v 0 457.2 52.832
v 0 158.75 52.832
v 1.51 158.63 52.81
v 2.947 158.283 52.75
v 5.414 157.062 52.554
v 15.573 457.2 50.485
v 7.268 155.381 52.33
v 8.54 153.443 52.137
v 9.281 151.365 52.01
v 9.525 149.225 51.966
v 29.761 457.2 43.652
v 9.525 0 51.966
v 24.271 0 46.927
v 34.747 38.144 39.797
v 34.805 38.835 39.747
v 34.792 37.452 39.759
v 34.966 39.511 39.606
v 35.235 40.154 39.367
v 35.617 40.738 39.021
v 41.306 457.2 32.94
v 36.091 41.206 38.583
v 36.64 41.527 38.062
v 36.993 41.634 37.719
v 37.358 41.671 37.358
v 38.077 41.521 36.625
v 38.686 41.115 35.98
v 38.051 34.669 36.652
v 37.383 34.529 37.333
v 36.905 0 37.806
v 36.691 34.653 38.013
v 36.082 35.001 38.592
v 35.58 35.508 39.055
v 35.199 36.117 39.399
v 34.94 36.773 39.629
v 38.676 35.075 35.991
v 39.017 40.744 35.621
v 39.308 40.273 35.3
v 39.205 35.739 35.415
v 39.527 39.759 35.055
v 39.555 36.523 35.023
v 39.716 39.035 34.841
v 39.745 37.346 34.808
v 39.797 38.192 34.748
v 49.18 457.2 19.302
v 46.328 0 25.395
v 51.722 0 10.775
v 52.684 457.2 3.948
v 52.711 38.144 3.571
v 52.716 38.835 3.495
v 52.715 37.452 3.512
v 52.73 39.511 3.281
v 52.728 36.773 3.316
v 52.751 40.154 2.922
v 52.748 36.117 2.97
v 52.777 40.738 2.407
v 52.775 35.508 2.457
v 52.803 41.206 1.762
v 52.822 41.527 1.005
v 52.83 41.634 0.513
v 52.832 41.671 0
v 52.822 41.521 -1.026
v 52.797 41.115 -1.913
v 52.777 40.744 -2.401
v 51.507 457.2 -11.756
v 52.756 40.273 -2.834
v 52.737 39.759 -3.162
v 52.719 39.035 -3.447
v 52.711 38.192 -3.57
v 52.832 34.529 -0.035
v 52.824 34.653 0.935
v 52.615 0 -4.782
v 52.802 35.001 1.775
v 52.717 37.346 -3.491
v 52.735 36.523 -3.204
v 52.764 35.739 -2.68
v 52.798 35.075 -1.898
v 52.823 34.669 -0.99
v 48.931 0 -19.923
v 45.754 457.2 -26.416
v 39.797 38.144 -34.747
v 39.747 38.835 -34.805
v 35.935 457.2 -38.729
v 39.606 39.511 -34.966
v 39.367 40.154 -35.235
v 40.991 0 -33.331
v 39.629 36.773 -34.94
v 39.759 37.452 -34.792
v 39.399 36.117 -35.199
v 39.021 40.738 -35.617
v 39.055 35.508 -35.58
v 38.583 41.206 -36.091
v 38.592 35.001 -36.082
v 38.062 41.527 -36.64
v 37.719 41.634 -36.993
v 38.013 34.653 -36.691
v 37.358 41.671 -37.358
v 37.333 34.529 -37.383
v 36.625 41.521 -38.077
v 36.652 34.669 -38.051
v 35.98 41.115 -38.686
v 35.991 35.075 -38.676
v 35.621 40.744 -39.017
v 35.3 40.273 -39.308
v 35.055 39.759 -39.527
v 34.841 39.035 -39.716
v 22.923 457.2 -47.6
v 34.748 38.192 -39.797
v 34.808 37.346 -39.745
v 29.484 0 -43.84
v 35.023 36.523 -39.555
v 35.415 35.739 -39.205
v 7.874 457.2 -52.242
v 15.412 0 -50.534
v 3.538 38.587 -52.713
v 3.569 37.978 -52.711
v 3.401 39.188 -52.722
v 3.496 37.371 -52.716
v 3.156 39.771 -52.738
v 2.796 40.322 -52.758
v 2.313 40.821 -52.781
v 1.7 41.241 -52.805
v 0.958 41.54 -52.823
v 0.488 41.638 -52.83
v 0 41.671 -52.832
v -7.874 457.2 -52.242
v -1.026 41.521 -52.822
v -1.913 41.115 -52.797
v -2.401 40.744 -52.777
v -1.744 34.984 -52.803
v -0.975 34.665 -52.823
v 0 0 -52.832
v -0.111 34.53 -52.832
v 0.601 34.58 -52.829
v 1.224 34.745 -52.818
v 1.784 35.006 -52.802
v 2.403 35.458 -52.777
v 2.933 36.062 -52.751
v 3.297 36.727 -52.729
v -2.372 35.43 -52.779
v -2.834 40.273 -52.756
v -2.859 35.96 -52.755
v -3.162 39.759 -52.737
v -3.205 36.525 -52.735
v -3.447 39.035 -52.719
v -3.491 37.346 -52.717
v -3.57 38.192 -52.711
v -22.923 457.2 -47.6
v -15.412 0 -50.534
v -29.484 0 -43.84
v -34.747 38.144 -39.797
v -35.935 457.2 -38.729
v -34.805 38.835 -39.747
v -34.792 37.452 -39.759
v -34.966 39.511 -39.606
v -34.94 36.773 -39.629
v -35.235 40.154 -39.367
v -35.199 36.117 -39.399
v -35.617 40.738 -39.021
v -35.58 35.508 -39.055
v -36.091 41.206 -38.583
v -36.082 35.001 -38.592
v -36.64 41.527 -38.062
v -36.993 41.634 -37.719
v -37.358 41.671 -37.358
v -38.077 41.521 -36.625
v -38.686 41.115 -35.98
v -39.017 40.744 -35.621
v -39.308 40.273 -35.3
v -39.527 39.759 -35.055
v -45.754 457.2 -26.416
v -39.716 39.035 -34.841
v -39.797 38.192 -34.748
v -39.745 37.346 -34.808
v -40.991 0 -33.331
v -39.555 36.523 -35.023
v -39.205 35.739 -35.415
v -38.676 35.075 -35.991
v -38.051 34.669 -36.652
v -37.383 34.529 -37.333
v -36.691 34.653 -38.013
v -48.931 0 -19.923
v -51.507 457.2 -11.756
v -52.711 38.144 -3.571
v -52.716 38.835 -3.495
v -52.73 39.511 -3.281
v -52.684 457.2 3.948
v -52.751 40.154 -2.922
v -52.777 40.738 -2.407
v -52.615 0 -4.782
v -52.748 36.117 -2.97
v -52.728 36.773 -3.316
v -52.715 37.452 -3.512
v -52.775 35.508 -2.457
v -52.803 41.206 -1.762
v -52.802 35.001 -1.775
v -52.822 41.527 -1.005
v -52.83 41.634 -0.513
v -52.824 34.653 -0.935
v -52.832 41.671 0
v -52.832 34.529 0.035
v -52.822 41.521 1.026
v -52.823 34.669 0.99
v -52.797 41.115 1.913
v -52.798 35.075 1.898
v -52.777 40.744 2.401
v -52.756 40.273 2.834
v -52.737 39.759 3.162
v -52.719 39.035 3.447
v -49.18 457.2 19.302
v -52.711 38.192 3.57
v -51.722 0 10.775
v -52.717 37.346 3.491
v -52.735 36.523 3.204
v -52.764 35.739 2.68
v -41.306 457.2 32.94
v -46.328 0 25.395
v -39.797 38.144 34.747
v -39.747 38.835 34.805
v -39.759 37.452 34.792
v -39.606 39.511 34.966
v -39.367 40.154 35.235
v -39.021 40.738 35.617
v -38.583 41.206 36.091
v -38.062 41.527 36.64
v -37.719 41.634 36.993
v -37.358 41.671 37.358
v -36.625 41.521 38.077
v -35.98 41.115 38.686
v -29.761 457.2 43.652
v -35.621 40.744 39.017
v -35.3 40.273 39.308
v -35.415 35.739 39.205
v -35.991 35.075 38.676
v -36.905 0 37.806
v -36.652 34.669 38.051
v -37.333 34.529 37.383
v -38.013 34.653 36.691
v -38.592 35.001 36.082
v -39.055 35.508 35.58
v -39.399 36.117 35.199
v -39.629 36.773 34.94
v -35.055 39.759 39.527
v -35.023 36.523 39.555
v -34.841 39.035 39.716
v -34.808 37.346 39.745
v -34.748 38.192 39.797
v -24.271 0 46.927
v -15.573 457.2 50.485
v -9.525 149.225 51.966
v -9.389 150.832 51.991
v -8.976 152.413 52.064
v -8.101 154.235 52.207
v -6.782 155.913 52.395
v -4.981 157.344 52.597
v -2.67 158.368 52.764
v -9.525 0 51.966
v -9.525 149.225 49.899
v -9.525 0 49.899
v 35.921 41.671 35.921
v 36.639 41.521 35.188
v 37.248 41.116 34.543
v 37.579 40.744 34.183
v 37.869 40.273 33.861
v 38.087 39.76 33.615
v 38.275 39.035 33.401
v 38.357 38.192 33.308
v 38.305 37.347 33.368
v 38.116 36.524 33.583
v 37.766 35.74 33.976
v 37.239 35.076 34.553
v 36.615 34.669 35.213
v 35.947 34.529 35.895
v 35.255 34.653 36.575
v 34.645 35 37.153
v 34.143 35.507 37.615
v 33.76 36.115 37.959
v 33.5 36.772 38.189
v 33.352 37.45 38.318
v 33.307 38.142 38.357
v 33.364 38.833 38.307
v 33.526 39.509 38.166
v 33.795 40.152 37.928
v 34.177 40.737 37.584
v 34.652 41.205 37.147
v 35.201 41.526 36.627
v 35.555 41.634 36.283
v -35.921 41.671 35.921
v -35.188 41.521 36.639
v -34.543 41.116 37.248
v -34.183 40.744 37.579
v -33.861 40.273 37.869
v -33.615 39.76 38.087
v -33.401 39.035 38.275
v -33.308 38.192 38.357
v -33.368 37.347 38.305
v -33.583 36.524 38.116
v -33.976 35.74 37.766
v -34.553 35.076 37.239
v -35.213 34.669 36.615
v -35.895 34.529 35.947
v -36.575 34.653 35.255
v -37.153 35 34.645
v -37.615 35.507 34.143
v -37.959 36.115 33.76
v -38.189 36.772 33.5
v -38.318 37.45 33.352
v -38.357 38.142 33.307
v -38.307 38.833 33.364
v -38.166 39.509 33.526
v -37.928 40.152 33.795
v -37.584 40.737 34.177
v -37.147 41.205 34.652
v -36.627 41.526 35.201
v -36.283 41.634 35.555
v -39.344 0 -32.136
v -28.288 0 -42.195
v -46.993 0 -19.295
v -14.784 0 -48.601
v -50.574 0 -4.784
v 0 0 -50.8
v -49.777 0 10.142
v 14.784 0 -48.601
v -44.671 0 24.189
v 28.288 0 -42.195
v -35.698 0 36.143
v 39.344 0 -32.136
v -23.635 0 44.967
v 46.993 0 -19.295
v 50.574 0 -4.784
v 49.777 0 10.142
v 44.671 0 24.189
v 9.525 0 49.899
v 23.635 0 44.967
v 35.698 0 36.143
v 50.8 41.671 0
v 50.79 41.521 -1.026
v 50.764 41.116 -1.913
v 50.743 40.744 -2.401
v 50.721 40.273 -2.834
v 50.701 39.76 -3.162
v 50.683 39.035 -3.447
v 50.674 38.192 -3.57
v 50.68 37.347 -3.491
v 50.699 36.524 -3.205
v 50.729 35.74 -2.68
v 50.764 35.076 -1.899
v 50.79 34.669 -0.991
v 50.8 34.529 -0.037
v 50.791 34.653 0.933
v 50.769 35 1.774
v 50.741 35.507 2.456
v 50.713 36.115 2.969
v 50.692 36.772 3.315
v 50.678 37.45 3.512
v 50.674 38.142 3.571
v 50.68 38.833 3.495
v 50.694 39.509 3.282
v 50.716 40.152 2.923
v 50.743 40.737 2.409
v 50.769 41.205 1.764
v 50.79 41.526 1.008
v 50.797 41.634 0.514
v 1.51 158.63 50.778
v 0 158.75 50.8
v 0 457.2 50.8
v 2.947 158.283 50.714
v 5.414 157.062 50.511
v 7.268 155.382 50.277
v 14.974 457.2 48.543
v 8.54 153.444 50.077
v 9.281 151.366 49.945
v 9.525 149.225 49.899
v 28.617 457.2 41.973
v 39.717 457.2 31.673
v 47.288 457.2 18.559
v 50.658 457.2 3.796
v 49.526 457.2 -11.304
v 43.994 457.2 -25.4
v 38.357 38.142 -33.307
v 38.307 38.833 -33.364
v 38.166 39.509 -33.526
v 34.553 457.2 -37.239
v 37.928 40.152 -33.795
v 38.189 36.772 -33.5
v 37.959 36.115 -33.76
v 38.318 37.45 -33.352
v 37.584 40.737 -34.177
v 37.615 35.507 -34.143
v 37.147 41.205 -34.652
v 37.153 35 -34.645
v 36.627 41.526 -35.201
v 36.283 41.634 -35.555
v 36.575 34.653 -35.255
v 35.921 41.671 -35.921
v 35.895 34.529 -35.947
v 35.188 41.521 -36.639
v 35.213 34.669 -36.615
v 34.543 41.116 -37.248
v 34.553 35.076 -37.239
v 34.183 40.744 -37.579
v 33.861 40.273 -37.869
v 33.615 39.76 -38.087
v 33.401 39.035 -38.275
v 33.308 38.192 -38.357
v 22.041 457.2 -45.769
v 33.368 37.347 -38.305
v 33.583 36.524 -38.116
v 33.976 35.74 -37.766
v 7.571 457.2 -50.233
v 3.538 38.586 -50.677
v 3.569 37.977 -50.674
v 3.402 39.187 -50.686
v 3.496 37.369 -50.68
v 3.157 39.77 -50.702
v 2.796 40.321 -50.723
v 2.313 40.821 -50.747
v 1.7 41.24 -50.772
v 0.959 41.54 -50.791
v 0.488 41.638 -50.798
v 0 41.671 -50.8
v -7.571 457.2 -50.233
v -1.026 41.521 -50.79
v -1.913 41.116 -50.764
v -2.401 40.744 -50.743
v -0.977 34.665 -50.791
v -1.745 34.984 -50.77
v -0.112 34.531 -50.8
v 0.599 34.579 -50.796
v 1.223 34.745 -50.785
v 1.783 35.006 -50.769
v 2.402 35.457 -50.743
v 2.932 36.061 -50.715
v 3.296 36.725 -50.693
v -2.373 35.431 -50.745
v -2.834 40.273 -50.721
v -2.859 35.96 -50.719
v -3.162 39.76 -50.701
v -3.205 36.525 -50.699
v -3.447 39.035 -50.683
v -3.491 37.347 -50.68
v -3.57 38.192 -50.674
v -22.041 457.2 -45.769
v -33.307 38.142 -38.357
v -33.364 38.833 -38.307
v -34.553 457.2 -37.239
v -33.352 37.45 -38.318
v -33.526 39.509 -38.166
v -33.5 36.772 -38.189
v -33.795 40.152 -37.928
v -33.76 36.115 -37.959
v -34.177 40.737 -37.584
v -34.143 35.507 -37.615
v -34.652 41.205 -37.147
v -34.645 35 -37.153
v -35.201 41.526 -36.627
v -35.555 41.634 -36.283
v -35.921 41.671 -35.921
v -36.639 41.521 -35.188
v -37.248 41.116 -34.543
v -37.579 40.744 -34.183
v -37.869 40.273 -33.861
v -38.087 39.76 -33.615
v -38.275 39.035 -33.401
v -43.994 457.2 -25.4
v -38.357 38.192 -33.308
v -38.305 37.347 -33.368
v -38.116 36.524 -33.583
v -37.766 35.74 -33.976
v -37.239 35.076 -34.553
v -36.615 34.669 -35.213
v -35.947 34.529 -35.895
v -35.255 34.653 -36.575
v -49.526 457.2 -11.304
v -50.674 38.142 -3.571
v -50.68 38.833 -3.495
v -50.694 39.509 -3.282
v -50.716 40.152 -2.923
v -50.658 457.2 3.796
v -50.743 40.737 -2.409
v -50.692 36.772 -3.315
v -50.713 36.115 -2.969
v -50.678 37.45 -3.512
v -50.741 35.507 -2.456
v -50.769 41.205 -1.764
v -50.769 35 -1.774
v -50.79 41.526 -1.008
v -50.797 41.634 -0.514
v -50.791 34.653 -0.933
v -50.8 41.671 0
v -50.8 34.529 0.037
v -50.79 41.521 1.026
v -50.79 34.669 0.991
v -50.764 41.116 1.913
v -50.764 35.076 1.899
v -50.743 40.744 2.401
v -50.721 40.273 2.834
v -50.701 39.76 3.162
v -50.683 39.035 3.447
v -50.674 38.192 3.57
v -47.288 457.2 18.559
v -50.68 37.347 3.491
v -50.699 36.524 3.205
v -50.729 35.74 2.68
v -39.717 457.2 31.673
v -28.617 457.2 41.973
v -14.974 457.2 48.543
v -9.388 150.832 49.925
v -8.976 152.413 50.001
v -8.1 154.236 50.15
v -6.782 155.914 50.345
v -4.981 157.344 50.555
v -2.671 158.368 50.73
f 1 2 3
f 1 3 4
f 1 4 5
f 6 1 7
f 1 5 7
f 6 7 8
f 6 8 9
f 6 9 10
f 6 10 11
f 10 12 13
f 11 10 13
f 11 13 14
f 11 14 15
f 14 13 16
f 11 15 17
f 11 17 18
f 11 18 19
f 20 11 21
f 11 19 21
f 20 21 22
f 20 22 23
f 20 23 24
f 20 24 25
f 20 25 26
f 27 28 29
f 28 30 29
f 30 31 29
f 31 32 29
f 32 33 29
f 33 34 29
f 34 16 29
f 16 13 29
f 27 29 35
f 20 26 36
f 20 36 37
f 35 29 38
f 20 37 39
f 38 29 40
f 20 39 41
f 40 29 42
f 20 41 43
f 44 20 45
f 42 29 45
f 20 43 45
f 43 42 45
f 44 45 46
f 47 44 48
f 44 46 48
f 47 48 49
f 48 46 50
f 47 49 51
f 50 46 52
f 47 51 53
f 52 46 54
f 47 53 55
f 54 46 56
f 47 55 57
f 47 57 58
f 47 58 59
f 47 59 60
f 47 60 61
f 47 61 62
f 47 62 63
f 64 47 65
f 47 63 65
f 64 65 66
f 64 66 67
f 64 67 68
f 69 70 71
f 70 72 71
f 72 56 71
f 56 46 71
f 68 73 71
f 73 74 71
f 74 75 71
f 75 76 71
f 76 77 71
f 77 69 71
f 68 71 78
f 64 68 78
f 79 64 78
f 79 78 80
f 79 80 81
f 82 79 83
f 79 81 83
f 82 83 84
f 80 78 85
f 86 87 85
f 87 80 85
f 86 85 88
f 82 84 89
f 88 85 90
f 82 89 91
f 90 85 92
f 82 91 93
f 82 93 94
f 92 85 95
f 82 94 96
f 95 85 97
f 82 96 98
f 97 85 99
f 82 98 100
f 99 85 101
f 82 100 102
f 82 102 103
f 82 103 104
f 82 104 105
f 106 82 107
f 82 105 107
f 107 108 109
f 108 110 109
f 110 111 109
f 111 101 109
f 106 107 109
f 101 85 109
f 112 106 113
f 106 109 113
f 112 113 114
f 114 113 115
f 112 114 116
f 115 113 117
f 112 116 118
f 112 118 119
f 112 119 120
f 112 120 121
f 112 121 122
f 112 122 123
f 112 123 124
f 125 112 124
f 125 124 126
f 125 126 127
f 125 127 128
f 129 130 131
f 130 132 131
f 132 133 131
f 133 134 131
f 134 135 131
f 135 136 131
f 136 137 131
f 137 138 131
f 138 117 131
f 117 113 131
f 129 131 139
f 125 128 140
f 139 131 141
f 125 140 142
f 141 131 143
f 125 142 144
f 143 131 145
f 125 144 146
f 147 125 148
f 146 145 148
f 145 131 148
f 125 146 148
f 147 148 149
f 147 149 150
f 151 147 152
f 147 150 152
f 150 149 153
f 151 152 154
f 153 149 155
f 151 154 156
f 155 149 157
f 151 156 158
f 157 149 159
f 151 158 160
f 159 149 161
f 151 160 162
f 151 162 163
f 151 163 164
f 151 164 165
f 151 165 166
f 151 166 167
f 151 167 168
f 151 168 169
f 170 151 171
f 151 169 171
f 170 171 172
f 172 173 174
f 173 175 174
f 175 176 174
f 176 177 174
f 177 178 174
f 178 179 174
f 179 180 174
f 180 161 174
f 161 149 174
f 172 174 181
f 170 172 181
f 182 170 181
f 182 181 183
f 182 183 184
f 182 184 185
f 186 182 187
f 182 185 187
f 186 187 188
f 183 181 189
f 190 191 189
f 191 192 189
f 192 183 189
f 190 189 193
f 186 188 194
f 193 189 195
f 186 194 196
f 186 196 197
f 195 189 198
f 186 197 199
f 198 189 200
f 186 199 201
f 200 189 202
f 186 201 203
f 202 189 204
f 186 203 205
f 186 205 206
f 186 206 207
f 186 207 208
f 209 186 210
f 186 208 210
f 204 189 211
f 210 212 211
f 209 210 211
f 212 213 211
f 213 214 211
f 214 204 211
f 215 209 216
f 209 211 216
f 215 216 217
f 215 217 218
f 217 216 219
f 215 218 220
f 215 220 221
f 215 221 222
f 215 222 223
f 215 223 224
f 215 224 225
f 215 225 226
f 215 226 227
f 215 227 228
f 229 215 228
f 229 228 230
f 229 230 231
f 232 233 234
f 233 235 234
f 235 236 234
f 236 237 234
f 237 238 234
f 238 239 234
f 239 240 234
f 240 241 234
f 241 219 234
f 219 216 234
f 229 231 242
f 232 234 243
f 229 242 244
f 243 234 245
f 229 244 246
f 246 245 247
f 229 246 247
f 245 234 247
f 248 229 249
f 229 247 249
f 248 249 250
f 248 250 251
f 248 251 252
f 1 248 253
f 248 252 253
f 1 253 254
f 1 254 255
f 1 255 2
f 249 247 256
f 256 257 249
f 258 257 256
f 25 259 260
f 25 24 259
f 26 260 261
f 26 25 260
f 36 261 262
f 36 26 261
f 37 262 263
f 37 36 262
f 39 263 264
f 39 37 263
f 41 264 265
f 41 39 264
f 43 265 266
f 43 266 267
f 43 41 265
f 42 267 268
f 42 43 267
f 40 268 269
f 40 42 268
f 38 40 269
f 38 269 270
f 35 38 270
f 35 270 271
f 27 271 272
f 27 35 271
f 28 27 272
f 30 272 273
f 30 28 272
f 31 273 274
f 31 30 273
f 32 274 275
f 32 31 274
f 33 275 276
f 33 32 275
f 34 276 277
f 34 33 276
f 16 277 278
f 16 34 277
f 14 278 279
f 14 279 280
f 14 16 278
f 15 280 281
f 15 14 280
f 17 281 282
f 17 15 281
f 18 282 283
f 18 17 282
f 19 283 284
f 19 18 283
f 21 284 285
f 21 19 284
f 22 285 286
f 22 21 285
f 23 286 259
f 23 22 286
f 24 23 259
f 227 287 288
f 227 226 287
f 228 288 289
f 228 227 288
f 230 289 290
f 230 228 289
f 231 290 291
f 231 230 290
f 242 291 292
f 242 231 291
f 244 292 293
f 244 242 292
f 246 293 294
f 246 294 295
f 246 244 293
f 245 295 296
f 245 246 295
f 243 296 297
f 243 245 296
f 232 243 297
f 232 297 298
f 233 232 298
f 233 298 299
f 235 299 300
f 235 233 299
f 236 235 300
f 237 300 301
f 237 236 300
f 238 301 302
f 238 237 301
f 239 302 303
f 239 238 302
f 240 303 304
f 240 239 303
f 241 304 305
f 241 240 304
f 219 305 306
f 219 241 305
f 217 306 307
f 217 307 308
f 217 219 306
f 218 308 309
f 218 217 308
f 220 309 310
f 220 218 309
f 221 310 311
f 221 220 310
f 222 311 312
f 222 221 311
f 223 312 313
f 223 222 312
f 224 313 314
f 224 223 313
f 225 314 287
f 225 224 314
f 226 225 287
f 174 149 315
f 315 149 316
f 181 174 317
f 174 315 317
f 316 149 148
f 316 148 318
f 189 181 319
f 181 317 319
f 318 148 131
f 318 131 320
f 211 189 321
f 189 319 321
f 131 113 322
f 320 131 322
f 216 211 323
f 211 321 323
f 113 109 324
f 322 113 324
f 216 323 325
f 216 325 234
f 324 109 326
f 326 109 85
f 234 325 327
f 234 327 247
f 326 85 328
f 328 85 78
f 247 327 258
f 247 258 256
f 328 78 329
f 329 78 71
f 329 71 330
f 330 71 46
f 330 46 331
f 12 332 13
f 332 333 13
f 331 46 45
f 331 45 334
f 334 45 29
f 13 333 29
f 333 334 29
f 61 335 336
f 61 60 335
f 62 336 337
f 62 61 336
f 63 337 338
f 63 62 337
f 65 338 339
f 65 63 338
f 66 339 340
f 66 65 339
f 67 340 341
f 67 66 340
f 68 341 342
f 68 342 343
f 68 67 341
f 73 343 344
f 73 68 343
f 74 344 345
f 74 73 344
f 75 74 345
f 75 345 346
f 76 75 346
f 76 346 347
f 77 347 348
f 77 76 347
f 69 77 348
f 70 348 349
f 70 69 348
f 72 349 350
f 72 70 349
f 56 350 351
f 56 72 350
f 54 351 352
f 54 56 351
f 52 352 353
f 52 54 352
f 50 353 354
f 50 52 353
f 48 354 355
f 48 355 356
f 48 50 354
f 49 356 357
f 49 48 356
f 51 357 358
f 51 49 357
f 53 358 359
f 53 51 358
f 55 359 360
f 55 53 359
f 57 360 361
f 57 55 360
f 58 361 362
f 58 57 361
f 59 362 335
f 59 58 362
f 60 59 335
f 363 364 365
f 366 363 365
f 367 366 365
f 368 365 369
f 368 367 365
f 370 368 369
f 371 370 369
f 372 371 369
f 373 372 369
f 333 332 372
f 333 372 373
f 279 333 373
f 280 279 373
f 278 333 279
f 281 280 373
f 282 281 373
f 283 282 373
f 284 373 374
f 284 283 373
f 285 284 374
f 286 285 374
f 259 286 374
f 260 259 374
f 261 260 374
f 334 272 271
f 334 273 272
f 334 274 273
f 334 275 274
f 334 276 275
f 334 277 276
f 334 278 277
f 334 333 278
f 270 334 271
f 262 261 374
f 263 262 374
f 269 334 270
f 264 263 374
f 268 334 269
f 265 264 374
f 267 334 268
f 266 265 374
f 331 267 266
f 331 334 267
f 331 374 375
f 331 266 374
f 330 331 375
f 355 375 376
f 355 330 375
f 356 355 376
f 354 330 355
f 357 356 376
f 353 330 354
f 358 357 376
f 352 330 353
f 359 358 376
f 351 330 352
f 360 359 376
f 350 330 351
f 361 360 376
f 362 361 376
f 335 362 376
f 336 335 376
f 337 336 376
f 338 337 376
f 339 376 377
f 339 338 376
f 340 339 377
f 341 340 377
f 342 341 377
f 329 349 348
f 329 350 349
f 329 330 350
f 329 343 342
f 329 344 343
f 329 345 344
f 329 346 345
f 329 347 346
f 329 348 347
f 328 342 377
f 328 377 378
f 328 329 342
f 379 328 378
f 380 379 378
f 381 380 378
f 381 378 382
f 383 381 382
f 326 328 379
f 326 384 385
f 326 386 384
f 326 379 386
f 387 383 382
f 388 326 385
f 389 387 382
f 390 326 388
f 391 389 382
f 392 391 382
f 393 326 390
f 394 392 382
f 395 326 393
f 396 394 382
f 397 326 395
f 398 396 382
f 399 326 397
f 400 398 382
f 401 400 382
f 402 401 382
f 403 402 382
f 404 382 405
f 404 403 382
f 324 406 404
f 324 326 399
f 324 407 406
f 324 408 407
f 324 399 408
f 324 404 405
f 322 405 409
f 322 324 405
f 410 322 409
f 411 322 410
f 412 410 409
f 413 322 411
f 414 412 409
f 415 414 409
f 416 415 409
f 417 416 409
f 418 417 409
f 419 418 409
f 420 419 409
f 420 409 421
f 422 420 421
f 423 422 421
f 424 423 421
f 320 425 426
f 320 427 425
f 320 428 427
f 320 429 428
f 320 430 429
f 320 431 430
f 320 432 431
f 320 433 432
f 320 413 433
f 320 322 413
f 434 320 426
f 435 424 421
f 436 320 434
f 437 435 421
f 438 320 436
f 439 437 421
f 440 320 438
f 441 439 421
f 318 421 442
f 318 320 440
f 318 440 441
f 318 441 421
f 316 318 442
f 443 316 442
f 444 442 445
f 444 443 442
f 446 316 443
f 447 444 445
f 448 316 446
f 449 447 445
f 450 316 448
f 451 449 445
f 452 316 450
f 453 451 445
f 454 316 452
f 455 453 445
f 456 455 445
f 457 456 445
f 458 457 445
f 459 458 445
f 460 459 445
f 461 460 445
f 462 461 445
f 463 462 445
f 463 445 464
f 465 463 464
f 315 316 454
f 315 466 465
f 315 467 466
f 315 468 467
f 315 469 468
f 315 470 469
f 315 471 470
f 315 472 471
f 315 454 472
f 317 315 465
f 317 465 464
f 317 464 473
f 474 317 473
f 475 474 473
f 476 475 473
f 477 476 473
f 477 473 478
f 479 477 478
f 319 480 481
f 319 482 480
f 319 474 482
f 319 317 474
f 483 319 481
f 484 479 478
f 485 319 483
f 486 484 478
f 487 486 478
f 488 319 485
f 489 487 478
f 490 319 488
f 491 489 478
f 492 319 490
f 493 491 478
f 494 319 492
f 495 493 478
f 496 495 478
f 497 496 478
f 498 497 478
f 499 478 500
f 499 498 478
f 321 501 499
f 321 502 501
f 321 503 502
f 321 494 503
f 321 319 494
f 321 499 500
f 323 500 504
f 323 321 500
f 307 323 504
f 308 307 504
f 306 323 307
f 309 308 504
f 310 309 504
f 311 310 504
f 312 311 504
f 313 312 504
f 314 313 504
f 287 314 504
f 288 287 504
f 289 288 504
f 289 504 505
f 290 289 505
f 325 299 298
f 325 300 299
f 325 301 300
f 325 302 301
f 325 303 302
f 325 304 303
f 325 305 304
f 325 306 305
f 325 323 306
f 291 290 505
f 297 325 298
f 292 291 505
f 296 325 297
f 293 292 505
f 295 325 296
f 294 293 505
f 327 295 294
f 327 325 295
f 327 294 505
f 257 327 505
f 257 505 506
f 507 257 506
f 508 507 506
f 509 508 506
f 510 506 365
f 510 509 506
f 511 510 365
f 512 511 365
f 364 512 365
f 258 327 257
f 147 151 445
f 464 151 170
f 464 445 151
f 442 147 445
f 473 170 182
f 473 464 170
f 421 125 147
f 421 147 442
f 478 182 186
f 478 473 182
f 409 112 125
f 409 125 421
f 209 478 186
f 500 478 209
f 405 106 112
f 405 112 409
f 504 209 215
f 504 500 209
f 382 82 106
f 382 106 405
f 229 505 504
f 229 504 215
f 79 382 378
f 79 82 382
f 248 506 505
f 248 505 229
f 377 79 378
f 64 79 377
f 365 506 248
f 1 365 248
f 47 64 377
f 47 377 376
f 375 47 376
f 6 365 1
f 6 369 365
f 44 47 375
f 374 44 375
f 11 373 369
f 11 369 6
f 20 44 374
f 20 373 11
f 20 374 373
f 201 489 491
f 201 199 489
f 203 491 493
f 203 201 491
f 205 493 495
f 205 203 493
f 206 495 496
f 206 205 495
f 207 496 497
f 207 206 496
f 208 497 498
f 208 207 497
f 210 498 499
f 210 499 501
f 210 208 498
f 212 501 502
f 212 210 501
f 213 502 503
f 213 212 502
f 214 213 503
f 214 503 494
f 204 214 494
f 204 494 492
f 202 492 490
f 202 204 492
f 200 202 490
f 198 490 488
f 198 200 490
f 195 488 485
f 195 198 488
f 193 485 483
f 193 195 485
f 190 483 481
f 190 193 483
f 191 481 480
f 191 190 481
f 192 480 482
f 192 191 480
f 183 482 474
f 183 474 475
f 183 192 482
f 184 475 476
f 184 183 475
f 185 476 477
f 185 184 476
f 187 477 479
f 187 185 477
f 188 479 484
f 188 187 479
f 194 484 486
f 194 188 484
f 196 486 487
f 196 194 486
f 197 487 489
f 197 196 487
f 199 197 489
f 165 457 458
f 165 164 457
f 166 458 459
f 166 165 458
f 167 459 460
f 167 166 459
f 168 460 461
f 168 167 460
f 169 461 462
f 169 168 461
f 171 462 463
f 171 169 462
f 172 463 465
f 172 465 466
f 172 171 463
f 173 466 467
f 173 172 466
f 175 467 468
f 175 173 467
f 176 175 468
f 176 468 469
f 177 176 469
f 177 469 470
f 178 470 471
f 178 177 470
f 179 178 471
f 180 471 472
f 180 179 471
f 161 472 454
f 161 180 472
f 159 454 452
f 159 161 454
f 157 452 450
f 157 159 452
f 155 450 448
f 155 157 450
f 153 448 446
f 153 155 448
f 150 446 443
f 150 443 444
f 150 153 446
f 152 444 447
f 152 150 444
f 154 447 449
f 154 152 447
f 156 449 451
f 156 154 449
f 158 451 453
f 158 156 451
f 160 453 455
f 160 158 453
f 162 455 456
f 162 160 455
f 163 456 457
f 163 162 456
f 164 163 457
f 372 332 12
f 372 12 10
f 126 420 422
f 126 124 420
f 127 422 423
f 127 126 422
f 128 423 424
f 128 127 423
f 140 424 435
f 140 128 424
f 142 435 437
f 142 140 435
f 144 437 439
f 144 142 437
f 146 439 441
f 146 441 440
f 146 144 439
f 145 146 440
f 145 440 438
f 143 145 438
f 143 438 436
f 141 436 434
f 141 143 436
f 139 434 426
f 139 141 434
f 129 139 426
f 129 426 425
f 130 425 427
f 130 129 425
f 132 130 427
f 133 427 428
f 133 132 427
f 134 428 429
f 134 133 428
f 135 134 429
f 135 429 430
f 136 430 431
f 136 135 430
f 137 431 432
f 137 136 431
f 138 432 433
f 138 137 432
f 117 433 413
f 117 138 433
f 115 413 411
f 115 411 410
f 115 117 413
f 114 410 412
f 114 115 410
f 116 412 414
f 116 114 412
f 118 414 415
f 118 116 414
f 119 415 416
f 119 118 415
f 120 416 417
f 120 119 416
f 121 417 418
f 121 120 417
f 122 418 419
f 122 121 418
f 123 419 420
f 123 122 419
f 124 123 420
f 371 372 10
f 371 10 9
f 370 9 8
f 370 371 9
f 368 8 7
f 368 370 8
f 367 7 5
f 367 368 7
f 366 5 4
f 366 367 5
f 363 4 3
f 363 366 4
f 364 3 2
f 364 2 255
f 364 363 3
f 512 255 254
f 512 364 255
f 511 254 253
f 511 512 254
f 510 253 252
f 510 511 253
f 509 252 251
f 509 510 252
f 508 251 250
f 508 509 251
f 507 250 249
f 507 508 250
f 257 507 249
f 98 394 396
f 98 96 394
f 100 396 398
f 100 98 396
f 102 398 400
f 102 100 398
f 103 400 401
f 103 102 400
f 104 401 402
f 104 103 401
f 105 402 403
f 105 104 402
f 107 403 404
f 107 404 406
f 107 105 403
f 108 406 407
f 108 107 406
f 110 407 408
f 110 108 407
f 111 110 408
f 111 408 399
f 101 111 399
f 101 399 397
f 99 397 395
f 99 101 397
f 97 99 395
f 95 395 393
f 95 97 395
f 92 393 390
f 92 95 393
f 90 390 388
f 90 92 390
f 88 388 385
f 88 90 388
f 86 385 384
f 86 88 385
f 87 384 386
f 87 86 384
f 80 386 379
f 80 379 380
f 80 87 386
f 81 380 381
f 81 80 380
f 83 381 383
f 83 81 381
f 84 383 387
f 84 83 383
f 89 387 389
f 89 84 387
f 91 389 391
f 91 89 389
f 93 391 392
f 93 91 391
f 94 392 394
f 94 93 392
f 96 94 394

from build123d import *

# Parameters (mm, degrees)
SKETCH1_R           = 52.832
SKETCH1_R_2         = 50.8
BOSS_EXTRUDE1_DEPTH = 457.2
CUT_EXTRUDE1_DEPTH  = 464.264805967
CIRPATTERN1_COUNT   = 8


with BuildPart() as part:
    # Sketch1 → Boss-Extrude1 (new body)
    with BuildSketch(Plane(origin=(0, 0, 0), x_dir=(1, 0, 0), z_dir=(0, 1, 0))):
        with Locations(Location((0, 0, 0), (0, 0, 270))):
            Circle(SKETCH1_R)
        with Locations(Location((0, 0, 0), (0, 0, 270))):
            Circle(SKETCH1_R_2, mode=Mode.SUBTRACT)
    extrude(amount=BOSS_EXTRUDE1_DEPTH)

    # Sketch2 → Cut-Extrude1 (cut, through all)
    with BuildSketch(Plane.XY):
        with BuildLine():
            Line((-9.525, 149.225), (-9.525, 0))
            Line((-9.525, 0), (9.525, 0))
            Line((9.525, 0), (9.525, 149.225))
            ThreePointArc((9.525, 149.225), (0, 158.75), (-9.525, 149.225))
        make_face()
    extrude(amount=CUT_EXTRUDE1_DEPTH, mode=Mode.SUBTRACT)

    # Sketch4 → 1/4 Clearance Hole1 (revolve, cut)
    with BuildSketch(Plane(origin=(0, 38.1, -52.832), x_dir=(0, 1, 0), z_dir=(1, 0, 0))):
        Polygon((0, 0), (0, 12.813817477), (3.57124, 10.668), (3.57124, 0), align=None)
    f_1_4_clearance_hole1 = revolve(axis=Axis((0, 38.1, -59.182), (0, 0, 1)), mode=Mode.SUBTRACT)

    # CirPattern1: 1/4 Clearance Hole1 ×8 about axis, 1 skipped
    cirpattern1_axis = Axis((0, 457.2, 0), (0, -1, 0))
    add([f_1_4_clearance_hole1.rotate(cirpattern1_axis, i * 360 / CIRPATTERN1_COUNT) for i in range(1, CIRPATTERN1_COUNT) if i not in (4,)], mode=Mode.SUBTRACT)


solid = part.part
